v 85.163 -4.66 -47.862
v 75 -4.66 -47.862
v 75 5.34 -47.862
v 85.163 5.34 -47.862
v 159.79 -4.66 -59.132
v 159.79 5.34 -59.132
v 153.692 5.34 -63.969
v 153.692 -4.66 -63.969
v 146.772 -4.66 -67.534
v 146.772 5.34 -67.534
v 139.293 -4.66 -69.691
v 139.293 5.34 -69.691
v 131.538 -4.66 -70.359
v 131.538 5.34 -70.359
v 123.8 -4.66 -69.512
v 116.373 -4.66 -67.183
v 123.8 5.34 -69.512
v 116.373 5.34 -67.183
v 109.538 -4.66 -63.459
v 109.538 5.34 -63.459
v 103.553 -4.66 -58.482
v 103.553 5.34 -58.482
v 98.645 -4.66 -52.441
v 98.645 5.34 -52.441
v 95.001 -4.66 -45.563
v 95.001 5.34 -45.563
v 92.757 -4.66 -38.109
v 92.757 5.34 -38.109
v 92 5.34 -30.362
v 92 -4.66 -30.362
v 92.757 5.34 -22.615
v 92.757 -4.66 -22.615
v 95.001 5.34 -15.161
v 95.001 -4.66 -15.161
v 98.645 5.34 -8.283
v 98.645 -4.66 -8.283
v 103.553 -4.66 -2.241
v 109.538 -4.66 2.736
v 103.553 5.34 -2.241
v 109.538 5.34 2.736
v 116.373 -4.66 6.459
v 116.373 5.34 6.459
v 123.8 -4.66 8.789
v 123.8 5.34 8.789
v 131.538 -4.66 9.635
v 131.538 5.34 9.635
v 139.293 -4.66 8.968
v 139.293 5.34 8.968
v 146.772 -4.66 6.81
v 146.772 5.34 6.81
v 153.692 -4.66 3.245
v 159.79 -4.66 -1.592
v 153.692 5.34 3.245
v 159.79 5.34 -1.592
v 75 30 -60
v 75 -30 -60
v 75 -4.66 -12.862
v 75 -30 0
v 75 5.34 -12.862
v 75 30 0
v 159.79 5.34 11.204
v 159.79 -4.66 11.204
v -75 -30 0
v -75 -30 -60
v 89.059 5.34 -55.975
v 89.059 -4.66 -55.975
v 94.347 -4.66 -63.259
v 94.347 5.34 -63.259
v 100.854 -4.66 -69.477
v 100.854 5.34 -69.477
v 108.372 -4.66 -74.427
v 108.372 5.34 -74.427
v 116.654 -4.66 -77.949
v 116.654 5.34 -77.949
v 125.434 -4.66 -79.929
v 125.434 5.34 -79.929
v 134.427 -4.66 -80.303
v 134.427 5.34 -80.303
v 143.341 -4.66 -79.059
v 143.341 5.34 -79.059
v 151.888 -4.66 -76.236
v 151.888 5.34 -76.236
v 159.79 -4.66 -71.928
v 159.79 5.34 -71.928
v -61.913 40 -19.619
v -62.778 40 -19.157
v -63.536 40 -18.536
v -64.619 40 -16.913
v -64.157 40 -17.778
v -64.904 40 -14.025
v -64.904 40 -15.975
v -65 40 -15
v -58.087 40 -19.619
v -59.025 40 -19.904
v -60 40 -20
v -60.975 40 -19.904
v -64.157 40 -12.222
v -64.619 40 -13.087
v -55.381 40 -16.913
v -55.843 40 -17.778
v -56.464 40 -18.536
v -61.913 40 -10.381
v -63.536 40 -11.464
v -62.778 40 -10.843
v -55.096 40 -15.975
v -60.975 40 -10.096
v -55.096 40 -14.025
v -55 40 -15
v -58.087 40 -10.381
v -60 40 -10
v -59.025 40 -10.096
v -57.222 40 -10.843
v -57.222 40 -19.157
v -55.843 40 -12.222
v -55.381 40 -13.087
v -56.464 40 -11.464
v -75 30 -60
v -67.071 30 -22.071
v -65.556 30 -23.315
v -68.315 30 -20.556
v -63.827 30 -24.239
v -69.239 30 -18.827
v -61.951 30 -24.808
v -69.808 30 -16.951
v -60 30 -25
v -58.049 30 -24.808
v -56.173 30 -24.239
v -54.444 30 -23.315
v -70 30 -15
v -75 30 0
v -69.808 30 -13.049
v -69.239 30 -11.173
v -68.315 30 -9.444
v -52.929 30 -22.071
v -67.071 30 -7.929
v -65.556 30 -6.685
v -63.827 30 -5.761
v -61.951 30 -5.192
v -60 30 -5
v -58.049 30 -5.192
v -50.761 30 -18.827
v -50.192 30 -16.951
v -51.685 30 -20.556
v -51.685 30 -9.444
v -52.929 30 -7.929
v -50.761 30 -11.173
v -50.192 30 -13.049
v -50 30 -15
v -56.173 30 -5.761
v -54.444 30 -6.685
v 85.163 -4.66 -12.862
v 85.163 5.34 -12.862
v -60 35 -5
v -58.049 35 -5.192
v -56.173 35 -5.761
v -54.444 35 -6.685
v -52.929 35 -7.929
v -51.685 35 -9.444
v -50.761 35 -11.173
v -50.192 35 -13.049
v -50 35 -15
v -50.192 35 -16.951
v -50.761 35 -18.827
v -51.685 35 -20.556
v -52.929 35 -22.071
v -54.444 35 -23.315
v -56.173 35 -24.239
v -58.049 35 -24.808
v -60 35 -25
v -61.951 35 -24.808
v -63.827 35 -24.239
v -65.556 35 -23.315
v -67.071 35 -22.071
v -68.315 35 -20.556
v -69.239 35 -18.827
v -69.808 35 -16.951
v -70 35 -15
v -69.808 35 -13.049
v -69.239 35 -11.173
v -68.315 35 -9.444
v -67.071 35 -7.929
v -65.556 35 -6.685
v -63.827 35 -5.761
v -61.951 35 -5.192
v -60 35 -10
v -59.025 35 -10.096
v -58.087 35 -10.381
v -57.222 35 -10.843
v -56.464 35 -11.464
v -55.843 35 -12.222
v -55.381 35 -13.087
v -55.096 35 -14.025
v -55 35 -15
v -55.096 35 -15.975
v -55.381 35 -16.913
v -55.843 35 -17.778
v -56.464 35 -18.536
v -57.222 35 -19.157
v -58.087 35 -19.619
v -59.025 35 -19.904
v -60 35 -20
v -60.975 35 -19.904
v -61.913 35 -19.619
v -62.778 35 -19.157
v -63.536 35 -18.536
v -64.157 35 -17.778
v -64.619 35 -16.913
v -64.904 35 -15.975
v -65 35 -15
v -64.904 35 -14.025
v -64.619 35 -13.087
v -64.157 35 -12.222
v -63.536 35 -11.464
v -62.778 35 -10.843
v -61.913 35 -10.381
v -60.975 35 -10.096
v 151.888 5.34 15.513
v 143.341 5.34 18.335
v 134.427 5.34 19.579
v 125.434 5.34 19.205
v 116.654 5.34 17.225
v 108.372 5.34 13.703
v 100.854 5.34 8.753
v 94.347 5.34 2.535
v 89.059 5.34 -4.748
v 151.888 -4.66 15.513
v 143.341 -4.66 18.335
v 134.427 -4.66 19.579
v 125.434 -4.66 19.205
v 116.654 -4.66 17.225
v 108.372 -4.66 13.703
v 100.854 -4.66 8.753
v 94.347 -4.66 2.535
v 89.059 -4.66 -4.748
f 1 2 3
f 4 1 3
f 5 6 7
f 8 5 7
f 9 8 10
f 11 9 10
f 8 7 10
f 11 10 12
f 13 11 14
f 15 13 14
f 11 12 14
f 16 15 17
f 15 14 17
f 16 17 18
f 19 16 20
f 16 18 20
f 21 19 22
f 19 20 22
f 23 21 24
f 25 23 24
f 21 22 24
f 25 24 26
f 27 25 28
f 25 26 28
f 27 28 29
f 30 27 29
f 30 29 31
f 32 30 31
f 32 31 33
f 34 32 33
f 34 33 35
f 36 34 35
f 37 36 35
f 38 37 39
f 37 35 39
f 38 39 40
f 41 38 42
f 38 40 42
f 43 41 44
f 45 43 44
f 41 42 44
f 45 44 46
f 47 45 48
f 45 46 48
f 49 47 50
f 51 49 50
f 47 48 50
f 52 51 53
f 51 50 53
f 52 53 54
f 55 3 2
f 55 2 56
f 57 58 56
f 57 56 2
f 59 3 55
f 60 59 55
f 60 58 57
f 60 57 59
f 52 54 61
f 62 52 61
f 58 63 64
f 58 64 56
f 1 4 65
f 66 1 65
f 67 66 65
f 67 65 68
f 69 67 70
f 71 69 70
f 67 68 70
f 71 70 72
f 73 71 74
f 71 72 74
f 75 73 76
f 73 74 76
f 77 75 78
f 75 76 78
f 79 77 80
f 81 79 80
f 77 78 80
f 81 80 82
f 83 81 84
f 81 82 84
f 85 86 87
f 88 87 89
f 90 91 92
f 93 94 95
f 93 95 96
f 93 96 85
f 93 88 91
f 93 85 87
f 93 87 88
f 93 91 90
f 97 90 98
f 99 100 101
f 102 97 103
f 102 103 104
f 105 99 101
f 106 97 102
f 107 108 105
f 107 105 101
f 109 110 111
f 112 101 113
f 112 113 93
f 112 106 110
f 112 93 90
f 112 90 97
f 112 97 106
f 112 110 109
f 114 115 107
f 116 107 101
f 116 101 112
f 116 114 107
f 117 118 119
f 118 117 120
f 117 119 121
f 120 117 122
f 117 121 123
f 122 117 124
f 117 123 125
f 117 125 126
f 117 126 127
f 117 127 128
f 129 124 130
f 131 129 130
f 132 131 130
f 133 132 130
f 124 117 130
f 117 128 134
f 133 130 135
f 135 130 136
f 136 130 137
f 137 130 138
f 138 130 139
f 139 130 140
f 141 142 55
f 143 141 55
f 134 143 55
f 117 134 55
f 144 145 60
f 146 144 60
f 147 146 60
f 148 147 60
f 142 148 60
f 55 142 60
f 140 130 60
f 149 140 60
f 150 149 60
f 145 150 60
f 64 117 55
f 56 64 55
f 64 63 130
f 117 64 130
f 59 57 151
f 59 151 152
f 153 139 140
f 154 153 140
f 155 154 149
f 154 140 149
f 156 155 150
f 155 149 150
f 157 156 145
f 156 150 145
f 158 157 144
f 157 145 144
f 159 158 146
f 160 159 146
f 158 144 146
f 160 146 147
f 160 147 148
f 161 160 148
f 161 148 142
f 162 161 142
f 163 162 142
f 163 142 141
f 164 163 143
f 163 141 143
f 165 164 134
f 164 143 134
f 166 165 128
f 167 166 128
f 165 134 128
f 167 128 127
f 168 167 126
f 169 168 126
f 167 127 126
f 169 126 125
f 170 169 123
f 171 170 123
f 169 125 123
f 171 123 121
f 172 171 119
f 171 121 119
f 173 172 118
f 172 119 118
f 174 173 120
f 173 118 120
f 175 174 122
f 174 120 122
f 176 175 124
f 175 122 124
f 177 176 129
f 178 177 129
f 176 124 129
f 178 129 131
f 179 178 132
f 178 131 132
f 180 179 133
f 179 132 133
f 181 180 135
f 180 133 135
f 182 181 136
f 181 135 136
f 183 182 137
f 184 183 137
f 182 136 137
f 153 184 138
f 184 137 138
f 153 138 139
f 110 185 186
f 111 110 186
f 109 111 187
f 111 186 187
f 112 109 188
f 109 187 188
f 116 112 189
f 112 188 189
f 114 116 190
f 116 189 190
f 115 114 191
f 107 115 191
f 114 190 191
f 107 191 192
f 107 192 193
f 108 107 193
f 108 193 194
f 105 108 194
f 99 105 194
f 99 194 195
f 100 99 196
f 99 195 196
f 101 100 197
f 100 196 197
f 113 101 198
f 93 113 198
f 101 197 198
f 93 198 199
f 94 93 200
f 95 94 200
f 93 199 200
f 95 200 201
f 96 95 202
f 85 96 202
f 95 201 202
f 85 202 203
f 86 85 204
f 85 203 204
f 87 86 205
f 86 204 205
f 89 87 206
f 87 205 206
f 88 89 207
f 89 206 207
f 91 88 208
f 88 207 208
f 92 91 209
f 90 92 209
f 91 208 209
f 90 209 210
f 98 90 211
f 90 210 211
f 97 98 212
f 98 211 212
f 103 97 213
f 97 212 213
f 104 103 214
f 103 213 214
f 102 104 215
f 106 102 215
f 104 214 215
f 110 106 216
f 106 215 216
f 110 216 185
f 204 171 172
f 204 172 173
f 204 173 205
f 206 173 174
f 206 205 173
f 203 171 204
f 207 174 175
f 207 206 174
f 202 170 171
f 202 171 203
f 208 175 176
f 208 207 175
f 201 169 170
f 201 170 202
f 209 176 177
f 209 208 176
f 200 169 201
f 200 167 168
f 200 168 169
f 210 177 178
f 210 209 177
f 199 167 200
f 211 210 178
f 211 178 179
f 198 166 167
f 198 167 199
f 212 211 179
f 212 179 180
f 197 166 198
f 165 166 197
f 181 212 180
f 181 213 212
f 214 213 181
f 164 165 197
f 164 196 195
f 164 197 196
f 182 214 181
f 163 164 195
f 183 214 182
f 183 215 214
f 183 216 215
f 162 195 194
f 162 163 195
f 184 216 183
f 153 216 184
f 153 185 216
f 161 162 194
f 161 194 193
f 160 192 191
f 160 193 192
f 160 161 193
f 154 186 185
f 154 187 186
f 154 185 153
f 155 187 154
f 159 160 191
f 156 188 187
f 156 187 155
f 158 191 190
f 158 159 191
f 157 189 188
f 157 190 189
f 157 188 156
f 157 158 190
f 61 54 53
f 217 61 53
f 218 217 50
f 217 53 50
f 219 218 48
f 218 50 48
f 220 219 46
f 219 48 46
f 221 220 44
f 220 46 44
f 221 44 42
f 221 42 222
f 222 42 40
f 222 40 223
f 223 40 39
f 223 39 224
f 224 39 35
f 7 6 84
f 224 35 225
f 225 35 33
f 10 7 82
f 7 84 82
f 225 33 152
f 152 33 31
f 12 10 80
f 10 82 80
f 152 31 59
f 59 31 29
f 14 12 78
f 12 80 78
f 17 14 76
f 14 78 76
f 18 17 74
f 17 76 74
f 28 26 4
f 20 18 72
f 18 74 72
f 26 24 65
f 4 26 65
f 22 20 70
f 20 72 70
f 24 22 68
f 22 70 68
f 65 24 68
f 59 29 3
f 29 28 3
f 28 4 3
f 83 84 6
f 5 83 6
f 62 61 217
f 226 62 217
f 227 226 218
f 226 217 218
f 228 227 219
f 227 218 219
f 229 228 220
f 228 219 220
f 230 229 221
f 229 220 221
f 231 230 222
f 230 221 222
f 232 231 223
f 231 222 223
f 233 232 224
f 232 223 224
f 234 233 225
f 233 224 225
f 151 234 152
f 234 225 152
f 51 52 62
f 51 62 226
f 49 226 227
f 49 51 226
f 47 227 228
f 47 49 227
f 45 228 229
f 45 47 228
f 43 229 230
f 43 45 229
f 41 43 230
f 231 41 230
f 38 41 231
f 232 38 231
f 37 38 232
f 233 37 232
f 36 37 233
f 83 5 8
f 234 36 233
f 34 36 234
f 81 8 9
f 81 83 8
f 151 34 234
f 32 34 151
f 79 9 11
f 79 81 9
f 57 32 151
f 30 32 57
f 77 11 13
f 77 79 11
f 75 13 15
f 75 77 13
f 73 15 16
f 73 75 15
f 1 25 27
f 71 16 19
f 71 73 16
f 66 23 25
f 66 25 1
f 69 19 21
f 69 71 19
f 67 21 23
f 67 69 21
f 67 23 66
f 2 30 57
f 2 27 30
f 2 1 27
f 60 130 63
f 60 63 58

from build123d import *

# Parameters (mm, degrees)
SKETCH1_W           = 150
SKETCH1_H           = 60
BOSS_EXTRUDE2_DEPTH = 60
SKETCH3_R           = 10
BOSS_EXTRUDE3_DEPTH = 5
SKETCH4_R           = 5
BOSS_EXTRUDE4_DEPTH = 5
SKETCH5_W           = 35
SKETCH5_H           = 10
BOSS_EXTRUDE5_DEPTH = 15
BOSS_EXTRUDE7_DEPTH = 10


with BuildPart() as part:
    # Sketch1 → Boss-Extrude2 (new body)
    with BuildSketch(Plane.XY):
        Rectangle(SKETCH1_W, SKETCH1_H)
    extrude(amount=-BOSS_EXTRUDE2_DEPTH)

    # Sketch3 → Boss-Extrude3 (add)
    with BuildSketch(Plane(origin=(0, 30, 0), x_dir=(1, 0, 0), z_dir=(0, 1, 0))):
        with Locations(Location((-60, 15, 0), (0, 0, 270))):
            Circle(SKETCH3_R)
    extrude(amount=BOSS_EXTRUDE3_DEPTH)

    # Sketch4 → Boss-Extrude4 (add)
    with BuildSketch(Plane(origin=(0, 35, 0), x_dir=(1, 0, 0), z_dir=(0, 1, 0))):
        with Locations(Location((-60, 15, 0), (0, 0, 270))):
            Circle(SKETCH4_R)
    extrude(amount=BOSS_EXTRUDE4_DEPTH)

    # Sketch5 → Boss-Extrude5 (add)
    with BuildSketch(Plane(origin=(75, 0, 0), x_dir=(0, 0, -1), z_dir=(1, 0, 0))):
        with Locations((30.361935687, 0.340382959)):
            Rectangle(SKETCH5_W, SKETCH5_H)
    extrude(amount=BOSS_EXTRUDE5_DEPTH)

    # Sketch6 → Boss-Extrude7 (add)
    with BuildSketch(Plane(origin=(0, 5.340382959, 0), x_dir=(1, 0, 0), z_dir=(0, 1, 0))):
        with BuildLine():
            Line((159.790141343, 1.592020078), (159.790141343, -11.203771863))
            ThreePointArc((159.790141343, -11.203771863), (82, 30.361935687), (159.790141343, 71.927643238))
            Line((159.790141343, 71.927643238), (159.790141343, 59.131851296))
            ThreePointArc((159.790141343, 59.131851296), (92, 30.361935687), (159.790141343, 1.592020078))
        make_face()
    extrude(amount=-BOSS_EXTRUDE7_DEPTH)


solid = part.part
